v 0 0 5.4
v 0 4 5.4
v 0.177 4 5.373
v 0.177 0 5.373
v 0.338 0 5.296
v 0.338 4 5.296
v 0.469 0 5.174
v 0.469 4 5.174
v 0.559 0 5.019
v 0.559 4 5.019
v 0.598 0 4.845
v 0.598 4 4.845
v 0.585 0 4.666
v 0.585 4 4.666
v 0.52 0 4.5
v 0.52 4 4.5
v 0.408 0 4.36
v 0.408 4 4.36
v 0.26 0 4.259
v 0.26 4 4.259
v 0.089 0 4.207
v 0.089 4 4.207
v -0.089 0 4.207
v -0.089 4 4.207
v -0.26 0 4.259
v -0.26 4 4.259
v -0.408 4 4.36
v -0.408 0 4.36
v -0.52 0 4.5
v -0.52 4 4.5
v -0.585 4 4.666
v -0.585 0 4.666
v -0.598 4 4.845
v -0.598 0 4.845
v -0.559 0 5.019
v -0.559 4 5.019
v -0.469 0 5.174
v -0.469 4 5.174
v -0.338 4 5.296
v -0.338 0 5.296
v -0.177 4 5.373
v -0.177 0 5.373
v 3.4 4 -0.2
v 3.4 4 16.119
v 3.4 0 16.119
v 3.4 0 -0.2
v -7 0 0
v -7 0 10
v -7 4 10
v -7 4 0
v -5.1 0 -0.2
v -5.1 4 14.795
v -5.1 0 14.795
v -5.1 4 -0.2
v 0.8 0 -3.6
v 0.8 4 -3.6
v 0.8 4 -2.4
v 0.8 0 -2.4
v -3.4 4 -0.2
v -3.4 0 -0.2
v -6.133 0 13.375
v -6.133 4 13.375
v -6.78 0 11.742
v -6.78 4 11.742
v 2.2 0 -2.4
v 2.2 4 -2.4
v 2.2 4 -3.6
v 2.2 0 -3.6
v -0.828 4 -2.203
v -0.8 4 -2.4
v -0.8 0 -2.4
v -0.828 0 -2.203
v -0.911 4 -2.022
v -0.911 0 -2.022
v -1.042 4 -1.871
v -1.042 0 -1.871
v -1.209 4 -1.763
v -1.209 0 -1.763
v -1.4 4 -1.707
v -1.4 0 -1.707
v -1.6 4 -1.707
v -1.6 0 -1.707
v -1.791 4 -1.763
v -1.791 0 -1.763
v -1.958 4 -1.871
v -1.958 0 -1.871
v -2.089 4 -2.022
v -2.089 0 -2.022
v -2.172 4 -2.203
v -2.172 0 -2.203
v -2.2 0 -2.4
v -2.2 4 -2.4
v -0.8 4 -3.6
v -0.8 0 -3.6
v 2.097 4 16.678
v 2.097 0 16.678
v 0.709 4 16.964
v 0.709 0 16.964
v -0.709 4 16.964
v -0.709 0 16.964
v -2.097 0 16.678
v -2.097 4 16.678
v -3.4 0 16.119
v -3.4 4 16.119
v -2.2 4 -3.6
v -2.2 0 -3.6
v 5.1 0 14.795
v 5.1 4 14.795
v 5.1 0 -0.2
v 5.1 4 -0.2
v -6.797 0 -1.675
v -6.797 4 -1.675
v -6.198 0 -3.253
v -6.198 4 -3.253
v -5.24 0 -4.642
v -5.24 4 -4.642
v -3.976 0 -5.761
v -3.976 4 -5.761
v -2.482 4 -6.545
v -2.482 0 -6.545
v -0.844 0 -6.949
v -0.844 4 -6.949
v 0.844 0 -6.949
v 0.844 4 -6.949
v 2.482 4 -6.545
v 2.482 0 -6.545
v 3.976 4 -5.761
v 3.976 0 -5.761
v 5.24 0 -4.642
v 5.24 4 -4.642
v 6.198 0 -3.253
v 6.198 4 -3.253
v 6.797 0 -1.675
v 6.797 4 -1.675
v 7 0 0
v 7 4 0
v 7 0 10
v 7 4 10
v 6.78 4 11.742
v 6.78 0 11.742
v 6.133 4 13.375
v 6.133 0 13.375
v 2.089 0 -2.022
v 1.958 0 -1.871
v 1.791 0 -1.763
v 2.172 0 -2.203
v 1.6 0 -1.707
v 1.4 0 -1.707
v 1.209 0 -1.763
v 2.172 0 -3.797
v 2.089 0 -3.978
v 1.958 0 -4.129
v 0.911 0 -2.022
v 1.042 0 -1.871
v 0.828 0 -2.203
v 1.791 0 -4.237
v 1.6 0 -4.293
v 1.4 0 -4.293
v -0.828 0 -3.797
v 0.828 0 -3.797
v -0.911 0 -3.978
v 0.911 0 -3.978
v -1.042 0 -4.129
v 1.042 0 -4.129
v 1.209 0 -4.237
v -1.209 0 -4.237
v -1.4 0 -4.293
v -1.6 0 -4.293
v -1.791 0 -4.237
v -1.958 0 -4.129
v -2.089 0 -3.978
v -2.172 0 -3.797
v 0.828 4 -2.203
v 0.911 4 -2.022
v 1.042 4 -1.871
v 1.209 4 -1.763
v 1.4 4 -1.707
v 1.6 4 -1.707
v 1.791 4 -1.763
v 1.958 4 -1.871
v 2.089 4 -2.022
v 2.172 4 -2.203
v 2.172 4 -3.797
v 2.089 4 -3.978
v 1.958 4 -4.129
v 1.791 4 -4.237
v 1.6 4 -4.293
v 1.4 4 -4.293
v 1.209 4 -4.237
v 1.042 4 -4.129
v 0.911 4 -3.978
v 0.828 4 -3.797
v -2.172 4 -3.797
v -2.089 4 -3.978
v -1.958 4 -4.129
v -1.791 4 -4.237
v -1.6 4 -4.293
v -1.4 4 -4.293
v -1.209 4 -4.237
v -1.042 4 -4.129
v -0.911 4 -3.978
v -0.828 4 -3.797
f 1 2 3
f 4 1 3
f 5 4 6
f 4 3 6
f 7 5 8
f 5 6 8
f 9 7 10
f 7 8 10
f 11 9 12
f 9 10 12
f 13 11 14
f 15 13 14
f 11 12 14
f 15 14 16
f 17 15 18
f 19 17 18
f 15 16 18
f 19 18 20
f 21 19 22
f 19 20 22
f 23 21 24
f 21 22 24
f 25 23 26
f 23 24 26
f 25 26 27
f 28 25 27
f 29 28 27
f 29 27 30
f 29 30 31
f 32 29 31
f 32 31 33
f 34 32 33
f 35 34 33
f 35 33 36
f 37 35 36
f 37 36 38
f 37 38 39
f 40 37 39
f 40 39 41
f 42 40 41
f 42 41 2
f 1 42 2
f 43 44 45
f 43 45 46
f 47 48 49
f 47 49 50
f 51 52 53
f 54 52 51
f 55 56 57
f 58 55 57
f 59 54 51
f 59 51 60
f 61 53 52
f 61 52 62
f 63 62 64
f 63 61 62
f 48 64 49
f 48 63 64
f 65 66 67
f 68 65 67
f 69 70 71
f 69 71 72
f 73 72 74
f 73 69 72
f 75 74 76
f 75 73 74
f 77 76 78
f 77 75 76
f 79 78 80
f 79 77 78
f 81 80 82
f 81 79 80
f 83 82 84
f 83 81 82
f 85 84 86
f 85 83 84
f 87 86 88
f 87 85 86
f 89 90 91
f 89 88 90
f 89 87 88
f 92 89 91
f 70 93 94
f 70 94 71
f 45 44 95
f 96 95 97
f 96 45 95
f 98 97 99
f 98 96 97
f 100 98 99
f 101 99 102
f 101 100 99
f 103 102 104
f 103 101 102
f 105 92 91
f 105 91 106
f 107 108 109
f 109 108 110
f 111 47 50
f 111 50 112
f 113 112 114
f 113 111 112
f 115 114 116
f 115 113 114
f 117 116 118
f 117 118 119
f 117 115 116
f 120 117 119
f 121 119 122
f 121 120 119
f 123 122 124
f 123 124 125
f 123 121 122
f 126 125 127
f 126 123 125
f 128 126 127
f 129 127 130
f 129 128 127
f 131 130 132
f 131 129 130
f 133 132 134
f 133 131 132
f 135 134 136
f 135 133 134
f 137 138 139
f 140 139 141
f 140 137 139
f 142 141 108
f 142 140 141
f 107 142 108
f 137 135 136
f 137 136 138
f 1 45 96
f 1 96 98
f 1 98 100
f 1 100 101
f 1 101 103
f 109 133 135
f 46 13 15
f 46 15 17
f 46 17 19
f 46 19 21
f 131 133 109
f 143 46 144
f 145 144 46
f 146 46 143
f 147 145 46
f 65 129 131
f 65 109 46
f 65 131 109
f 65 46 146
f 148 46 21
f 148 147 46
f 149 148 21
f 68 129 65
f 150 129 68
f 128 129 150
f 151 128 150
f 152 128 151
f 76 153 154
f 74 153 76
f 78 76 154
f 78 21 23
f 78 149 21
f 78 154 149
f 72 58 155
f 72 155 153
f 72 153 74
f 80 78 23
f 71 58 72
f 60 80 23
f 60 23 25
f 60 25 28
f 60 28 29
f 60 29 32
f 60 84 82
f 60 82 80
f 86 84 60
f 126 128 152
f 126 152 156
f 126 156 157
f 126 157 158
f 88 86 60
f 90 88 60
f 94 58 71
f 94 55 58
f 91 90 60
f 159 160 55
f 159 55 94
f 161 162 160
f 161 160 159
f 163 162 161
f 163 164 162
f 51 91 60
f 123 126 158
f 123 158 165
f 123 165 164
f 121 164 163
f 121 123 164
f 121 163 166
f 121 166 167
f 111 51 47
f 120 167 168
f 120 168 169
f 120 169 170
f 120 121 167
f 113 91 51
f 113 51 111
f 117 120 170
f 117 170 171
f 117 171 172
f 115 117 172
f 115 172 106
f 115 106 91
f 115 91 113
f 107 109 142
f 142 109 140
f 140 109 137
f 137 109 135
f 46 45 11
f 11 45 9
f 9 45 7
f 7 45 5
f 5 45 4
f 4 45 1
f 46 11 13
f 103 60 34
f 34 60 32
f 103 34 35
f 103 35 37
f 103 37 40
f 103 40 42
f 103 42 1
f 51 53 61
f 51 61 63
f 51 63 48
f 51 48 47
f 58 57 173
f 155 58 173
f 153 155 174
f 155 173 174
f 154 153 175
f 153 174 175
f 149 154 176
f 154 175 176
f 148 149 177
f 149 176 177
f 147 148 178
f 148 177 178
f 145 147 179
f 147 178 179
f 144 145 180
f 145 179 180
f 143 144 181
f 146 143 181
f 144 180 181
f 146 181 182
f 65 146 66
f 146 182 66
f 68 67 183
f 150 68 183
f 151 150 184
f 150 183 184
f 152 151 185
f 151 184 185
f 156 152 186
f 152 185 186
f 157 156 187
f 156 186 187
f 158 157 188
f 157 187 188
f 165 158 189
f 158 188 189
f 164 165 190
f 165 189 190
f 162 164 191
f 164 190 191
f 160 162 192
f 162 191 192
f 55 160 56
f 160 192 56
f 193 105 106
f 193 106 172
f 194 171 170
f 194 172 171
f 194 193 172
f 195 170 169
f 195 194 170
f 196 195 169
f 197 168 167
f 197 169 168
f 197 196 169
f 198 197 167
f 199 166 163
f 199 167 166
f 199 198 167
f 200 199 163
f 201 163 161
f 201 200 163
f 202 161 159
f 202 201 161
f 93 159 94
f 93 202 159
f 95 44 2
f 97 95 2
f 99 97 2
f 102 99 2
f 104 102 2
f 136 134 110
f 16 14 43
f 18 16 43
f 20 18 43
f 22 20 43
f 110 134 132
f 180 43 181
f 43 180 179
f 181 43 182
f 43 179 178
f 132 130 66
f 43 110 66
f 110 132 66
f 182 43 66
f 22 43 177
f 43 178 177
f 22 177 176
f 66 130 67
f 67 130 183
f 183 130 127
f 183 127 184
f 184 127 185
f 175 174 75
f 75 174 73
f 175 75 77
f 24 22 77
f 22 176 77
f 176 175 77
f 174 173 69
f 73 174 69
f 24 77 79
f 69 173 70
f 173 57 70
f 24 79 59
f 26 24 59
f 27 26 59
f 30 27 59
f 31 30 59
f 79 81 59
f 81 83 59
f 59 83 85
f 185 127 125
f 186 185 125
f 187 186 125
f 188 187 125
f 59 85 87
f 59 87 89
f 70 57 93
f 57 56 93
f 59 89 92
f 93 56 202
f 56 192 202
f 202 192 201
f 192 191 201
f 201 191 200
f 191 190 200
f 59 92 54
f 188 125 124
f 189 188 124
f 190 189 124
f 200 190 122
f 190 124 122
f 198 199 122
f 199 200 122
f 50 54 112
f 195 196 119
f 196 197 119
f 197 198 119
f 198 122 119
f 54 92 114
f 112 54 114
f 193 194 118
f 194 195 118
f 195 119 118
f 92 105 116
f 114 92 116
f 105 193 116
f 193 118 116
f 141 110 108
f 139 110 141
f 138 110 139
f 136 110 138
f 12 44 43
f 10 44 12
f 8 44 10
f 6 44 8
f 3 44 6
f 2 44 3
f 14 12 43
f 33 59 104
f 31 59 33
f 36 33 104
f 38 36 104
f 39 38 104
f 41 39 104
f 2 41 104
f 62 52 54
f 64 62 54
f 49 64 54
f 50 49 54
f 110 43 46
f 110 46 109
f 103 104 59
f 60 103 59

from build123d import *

# Parameters (mm, degrees)
EXTRUDE_1_DEPTH     = 4
SKETCH_2_W          = 1.7
SKETCH_2_H          = 55.892000818
CUT_EXTRUDE_1_DEPTH = 19.814887722
CUT_EXTRUDE_2_DEPTH = 19.814887722
SKETCH_4_R          = 0.6
CUT_EXTRUDE_3_DEPTH = 19.814887722


with BuildPart() as part:
    # 草图1 → 凸台-拉伸1 (new body)
    with BuildSketch(Plane(origin=(0, 0, 0), x_dir=(1, 0, 0), z_dir=(0, 1, 0))):
        with BuildLine():
            Line((7, 0), (7, -10))
            ThreePointArc((7, -10), (0, -17), (-7, -10))
            Line((-7, -10), (-7, 0))
            ThreePointArc((-7, 0), (0, 7), (7, 0))
        make_face()
    extrude(amount=EXTRUDE_1_DEPTH)

    # 草图2 → 切除-拉伸1 (cut, through all)
    with BuildSketch(Plane(origin=(0, 4, 0), x_dir=(1, 0, 0), z_dir=(0, 1, 0))):
        with Locations((-4.25, -27.746000409)):
            Rectangle(SKETCH_2_W, SKETCH_2_H)
        with Locations((4.25, -27.746000409)):
            Rectangle(SKETCH_2_W, SKETCH_2_H)
    extrude(amount=-CUT_EXTRUDE_1_DEPTH, mode=Mode.SUBTRACT)

    # 草图3 → 切除-拉伸2 (cut, through all)
    with BuildSketch(Plane(origin=(0, 4, 0), x_dir=(1, 0, 0), z_dir=(0, 1, 0))):
        with BuildLine():
            Line((-2.2, 2.4), (-2.2, 3.6))
            ThreePointArc((-2.2, 3.6), (-1.5, 4.3), (-0.8, 3.6))
            Line((-0.8, 3.6), (-0.8, 2.4))
            ThreePointArc((-0.8, 2.4), (-1.5, 1.7), (-2.2, 2.4))
        make_face()
        with BuildLine():
            Line((2.2, 2.4), (2.2, 3.6))
            ThreePointArc((2.2, 3.6), (1.5, 4.3), (0.8, 3.6))
            Line((0.8, 3.6), (0.8, 2.4))
            ThreePointArc((0.8, 2.4), (1.5, 1.7), (2.2, 2.4))
        make_face()
    extrude(amount=-CUT_EXTRUDE_2_DEPTH, mode=Mode.SUBTRACT)

    # 草图4 → 切除-拉伸3 (cut, through all)
    with BuildSketch(Plane(origin=(0, 4, 0), x_dir=(1, 0, 0), z_dir=(0, 1, 0))):
        with Locations(Location((0, -4.8, 0), (0, 0, 270))):
            Circle(SKETCH_4_R)
    extrude(amount=-CUT_EXTRUDE_3_DEPTH, mode=Mode.SUBTRACT)


solid = part.part
